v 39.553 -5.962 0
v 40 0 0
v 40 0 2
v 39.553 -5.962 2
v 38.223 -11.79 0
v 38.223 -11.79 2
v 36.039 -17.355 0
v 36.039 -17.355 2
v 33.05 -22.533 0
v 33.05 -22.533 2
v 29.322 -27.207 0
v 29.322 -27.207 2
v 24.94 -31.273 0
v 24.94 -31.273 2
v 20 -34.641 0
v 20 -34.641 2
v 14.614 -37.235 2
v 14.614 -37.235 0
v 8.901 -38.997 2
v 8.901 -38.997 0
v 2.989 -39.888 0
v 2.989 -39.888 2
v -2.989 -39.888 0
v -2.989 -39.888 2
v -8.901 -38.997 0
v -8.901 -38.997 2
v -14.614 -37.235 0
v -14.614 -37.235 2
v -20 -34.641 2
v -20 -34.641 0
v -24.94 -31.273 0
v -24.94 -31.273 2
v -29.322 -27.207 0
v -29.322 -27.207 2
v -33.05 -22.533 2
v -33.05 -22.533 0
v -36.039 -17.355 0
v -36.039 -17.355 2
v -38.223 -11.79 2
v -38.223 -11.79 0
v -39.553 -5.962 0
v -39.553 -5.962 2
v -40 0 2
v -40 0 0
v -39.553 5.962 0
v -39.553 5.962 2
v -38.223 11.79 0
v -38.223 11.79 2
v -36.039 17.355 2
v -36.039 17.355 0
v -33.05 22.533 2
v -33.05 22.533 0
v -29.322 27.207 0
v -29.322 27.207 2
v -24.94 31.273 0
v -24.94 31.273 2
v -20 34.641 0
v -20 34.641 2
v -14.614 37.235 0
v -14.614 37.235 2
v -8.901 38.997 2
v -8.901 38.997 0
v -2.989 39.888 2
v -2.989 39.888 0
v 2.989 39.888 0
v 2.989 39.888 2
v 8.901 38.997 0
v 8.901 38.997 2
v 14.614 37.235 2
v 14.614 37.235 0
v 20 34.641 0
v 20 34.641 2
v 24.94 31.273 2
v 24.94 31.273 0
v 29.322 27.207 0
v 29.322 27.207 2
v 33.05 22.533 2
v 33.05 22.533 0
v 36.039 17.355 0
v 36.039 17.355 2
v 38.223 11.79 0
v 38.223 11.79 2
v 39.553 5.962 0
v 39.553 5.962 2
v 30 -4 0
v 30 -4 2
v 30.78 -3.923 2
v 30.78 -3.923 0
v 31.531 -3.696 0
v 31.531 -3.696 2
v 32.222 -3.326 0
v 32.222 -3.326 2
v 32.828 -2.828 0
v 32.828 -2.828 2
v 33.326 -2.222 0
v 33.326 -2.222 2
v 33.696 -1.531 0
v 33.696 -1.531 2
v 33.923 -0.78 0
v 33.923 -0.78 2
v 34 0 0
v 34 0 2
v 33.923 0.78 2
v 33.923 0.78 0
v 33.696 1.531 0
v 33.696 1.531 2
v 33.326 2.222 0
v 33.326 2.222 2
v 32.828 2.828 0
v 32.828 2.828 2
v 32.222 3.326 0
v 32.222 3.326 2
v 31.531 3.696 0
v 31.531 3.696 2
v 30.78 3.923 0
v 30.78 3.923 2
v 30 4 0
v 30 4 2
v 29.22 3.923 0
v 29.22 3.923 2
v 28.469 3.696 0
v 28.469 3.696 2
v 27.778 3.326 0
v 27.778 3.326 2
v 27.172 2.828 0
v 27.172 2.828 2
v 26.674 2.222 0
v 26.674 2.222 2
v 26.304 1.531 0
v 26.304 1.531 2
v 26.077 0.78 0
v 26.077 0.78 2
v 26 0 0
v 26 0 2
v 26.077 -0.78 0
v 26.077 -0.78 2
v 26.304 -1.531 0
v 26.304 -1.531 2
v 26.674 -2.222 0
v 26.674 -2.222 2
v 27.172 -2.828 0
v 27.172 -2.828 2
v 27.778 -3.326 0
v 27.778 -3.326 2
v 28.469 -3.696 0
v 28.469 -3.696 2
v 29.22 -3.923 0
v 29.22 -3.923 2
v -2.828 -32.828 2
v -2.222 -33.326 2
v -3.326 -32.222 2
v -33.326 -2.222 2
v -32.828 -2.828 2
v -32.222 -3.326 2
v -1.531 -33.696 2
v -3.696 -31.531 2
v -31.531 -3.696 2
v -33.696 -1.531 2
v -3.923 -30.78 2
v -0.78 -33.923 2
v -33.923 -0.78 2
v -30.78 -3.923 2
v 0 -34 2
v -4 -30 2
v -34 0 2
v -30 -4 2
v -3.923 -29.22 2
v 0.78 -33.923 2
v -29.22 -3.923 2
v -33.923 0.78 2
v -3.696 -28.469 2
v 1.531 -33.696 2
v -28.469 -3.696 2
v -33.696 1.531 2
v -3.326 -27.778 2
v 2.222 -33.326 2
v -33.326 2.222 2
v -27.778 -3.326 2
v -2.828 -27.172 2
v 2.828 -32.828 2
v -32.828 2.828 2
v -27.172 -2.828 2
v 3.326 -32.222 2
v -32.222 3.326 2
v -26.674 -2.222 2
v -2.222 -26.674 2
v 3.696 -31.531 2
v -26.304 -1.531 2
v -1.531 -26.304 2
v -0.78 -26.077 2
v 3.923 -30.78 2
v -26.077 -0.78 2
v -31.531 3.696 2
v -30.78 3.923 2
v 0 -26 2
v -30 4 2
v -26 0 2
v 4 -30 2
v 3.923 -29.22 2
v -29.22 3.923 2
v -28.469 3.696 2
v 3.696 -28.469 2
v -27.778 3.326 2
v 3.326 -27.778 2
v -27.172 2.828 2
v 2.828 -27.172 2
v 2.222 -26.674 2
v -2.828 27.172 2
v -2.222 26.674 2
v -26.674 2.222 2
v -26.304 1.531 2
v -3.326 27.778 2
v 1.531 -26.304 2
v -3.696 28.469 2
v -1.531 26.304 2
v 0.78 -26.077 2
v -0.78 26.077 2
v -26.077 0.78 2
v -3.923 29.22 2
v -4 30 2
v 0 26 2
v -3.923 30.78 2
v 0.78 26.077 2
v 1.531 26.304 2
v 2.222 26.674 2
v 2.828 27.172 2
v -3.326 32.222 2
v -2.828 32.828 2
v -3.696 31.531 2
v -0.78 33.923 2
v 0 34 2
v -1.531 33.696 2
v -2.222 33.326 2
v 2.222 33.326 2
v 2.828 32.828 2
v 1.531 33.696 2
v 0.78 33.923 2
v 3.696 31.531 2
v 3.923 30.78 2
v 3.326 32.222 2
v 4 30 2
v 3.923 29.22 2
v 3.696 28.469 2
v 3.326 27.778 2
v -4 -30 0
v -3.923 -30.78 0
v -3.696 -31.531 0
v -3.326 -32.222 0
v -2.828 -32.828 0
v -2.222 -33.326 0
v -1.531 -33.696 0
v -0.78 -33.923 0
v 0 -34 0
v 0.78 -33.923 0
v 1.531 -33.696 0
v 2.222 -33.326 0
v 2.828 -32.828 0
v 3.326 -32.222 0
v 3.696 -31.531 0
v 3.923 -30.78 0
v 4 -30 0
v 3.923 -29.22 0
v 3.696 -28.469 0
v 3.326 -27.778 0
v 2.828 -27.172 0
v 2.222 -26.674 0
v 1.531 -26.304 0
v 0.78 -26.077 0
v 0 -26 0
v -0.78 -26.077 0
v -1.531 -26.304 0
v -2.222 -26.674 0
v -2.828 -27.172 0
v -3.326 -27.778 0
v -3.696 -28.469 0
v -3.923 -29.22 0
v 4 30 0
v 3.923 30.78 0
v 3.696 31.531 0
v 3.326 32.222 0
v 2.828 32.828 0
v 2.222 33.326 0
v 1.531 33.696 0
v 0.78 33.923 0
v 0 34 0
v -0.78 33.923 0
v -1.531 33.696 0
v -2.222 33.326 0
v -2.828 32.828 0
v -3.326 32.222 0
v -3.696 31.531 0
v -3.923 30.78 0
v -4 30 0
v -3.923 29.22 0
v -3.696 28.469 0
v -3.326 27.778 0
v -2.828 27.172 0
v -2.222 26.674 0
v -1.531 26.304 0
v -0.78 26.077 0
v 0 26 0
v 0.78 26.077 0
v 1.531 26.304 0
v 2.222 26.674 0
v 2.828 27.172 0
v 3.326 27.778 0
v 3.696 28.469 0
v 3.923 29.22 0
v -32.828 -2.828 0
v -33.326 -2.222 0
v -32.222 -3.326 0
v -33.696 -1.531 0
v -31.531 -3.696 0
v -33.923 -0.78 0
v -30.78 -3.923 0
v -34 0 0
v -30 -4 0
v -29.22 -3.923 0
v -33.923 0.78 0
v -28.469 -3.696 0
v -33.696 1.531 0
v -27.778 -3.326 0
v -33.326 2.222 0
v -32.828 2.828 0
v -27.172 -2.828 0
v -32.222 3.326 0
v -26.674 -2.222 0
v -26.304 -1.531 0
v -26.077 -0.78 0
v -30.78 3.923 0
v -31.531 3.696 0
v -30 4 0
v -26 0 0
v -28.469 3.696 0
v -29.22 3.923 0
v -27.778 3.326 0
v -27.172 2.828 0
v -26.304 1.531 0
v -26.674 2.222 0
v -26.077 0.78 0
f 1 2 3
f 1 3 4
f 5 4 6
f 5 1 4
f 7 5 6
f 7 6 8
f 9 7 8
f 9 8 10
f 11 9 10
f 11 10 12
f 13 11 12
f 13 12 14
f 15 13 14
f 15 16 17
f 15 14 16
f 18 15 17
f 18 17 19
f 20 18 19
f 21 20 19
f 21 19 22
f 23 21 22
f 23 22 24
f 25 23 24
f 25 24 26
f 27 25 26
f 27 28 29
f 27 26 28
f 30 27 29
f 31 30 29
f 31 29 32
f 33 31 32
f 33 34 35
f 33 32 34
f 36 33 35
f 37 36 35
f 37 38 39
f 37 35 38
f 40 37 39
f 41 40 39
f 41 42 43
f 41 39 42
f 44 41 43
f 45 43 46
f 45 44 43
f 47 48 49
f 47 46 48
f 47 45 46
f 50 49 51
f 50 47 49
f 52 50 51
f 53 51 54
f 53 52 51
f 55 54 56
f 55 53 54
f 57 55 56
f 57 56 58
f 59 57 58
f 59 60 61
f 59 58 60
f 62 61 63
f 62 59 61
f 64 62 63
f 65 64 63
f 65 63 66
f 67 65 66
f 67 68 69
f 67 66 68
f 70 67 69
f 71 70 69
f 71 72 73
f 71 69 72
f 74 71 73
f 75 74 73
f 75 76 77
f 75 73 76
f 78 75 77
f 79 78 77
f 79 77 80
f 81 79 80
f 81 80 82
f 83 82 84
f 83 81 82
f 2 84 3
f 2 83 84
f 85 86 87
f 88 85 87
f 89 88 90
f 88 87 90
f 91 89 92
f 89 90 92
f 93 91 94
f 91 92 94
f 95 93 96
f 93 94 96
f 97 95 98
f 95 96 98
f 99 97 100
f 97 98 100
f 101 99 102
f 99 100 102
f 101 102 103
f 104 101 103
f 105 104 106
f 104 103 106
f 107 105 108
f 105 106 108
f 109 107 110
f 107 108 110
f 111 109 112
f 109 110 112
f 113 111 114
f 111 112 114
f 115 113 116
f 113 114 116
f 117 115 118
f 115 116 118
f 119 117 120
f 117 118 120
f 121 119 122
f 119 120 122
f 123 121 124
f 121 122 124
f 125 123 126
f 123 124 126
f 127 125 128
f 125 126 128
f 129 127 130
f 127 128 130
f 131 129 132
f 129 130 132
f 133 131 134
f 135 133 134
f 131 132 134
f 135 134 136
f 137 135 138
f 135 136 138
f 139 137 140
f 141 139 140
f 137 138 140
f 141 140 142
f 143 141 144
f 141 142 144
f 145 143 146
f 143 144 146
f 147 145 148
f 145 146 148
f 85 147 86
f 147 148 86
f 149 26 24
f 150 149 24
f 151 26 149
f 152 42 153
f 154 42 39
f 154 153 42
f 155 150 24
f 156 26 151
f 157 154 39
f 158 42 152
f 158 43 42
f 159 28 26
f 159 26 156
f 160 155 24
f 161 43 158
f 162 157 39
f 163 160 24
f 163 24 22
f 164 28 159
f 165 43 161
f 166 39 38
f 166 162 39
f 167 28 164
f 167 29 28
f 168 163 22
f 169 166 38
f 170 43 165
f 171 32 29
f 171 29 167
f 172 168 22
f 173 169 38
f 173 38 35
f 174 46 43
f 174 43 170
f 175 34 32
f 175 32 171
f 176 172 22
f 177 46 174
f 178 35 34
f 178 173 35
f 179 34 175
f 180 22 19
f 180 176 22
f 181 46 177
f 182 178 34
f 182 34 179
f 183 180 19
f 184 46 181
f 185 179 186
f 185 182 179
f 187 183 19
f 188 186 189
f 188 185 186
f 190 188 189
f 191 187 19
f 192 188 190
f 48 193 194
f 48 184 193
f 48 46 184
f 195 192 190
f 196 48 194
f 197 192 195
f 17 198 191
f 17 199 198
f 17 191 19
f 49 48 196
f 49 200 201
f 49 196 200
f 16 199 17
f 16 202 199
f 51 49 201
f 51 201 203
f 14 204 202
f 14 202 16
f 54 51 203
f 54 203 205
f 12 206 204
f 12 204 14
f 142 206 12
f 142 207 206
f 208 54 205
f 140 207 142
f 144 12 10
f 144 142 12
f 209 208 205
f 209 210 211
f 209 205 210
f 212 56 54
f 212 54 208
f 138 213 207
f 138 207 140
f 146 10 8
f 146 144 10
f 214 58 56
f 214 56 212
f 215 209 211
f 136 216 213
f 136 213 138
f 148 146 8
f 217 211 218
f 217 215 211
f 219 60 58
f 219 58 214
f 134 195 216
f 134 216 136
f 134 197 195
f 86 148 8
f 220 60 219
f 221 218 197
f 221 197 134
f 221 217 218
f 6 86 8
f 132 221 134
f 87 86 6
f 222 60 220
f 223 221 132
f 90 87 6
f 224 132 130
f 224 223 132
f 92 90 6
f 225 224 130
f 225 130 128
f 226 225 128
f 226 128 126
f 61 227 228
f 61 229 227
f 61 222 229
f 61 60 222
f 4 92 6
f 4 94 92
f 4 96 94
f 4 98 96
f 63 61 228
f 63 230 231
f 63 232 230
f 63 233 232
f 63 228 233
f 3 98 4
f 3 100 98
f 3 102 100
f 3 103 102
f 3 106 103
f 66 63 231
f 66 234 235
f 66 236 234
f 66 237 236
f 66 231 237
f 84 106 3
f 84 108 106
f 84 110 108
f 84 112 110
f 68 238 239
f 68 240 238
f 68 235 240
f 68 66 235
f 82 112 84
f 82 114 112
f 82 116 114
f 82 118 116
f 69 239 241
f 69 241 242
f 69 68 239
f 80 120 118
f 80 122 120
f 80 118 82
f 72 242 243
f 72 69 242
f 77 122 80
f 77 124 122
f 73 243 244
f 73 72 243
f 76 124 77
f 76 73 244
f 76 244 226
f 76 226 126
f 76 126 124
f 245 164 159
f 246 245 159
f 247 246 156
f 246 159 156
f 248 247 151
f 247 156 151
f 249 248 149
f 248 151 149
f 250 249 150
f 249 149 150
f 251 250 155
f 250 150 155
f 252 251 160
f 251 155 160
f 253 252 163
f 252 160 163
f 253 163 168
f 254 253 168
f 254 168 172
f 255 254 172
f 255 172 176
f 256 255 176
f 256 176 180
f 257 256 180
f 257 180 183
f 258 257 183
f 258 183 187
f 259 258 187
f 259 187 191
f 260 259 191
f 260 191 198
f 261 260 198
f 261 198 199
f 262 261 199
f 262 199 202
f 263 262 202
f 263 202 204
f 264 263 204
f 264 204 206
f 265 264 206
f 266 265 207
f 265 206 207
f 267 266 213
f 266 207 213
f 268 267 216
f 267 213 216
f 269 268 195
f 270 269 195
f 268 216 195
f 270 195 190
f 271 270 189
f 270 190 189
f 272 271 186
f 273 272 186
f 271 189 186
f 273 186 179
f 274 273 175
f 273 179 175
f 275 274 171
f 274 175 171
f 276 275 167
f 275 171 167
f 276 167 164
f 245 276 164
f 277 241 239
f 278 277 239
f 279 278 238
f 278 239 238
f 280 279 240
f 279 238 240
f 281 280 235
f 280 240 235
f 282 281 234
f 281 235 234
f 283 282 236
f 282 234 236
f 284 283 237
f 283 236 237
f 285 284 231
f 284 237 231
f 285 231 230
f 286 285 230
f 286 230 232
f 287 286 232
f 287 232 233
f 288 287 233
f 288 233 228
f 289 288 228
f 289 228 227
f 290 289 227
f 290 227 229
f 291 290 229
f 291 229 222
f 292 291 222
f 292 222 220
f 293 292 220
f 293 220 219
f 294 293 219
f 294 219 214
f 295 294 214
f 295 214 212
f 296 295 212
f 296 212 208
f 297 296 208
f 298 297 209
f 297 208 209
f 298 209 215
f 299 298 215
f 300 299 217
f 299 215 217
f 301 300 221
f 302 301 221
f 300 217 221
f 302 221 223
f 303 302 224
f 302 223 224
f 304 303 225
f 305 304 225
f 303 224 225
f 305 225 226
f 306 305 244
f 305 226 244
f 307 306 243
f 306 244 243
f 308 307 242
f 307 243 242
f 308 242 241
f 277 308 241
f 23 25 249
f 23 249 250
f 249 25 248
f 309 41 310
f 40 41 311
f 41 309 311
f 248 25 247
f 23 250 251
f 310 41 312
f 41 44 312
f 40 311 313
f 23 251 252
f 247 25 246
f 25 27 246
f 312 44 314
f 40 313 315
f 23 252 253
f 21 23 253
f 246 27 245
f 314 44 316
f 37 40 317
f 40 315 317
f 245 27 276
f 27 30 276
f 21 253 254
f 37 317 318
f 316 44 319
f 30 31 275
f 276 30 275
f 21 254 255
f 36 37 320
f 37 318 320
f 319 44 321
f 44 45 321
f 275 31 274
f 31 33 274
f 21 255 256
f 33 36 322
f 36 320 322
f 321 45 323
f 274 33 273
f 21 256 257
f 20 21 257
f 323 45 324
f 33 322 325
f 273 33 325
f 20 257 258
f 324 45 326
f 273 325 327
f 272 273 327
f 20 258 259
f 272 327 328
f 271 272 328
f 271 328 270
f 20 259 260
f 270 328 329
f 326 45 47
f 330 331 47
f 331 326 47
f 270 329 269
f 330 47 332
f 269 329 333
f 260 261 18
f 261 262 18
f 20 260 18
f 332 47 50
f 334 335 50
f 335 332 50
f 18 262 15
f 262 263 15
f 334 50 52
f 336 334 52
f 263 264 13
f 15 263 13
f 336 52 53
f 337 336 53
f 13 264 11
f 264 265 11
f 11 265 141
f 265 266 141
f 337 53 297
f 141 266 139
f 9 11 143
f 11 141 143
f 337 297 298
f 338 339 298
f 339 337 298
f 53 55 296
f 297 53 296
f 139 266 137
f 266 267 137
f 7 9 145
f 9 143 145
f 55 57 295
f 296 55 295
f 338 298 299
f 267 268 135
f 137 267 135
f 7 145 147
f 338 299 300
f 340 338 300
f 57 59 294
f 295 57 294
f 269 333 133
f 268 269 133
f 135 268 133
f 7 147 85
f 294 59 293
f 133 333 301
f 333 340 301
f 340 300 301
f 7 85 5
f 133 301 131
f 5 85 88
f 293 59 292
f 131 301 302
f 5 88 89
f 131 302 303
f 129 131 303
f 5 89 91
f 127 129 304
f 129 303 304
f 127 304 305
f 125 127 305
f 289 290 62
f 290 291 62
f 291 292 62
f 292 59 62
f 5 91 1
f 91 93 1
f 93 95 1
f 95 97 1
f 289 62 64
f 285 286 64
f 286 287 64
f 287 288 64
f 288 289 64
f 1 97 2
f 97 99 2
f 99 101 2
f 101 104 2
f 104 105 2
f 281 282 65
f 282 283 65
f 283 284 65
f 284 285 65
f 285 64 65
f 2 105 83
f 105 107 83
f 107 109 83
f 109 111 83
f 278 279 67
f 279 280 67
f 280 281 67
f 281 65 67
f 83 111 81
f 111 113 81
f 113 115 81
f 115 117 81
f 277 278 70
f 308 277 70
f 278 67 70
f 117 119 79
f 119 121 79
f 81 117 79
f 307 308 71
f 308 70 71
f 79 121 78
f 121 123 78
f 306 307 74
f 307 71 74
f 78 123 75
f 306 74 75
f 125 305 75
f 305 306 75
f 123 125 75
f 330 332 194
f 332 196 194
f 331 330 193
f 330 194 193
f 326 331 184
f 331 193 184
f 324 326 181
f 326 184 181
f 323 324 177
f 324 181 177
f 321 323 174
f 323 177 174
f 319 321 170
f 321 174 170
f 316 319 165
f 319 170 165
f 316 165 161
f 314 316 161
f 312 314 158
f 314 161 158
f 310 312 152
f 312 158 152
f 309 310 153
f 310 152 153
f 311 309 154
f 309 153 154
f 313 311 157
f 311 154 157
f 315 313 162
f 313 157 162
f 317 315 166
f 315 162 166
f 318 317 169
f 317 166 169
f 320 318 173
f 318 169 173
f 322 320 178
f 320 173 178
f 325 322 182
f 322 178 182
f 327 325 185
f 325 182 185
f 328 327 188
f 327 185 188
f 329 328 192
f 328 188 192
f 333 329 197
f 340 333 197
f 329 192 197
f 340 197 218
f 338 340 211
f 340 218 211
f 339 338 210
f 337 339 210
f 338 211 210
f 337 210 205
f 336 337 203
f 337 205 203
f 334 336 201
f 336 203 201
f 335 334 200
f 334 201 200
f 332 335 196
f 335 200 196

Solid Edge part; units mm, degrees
sketch "Sketch1" plane through (0, 0, 0) normal (0, 0, 1) x (1, 0, 0)
  circle A0 centre (0, 0) radius 40
  dimension "D1" = 80
extrude "Protrusion1" add sketch "Sketch1" along normal blind 2
sketch "Sketch2" plane through (0, 0, 2) normal (0, 0, 1) x (1, 0, 0)
  circle A0 centre (0, 30) radius 4
  dimension "D1" = 8
  dimension "D2" = 30
extrude "Cutout1" cut sketch "Sketch2" against normal up to next
pattern_circular "Pattern1" count 4 over 360 about axis through (0, 0, 2) along (0, 0, 1) of "Cutout1"
